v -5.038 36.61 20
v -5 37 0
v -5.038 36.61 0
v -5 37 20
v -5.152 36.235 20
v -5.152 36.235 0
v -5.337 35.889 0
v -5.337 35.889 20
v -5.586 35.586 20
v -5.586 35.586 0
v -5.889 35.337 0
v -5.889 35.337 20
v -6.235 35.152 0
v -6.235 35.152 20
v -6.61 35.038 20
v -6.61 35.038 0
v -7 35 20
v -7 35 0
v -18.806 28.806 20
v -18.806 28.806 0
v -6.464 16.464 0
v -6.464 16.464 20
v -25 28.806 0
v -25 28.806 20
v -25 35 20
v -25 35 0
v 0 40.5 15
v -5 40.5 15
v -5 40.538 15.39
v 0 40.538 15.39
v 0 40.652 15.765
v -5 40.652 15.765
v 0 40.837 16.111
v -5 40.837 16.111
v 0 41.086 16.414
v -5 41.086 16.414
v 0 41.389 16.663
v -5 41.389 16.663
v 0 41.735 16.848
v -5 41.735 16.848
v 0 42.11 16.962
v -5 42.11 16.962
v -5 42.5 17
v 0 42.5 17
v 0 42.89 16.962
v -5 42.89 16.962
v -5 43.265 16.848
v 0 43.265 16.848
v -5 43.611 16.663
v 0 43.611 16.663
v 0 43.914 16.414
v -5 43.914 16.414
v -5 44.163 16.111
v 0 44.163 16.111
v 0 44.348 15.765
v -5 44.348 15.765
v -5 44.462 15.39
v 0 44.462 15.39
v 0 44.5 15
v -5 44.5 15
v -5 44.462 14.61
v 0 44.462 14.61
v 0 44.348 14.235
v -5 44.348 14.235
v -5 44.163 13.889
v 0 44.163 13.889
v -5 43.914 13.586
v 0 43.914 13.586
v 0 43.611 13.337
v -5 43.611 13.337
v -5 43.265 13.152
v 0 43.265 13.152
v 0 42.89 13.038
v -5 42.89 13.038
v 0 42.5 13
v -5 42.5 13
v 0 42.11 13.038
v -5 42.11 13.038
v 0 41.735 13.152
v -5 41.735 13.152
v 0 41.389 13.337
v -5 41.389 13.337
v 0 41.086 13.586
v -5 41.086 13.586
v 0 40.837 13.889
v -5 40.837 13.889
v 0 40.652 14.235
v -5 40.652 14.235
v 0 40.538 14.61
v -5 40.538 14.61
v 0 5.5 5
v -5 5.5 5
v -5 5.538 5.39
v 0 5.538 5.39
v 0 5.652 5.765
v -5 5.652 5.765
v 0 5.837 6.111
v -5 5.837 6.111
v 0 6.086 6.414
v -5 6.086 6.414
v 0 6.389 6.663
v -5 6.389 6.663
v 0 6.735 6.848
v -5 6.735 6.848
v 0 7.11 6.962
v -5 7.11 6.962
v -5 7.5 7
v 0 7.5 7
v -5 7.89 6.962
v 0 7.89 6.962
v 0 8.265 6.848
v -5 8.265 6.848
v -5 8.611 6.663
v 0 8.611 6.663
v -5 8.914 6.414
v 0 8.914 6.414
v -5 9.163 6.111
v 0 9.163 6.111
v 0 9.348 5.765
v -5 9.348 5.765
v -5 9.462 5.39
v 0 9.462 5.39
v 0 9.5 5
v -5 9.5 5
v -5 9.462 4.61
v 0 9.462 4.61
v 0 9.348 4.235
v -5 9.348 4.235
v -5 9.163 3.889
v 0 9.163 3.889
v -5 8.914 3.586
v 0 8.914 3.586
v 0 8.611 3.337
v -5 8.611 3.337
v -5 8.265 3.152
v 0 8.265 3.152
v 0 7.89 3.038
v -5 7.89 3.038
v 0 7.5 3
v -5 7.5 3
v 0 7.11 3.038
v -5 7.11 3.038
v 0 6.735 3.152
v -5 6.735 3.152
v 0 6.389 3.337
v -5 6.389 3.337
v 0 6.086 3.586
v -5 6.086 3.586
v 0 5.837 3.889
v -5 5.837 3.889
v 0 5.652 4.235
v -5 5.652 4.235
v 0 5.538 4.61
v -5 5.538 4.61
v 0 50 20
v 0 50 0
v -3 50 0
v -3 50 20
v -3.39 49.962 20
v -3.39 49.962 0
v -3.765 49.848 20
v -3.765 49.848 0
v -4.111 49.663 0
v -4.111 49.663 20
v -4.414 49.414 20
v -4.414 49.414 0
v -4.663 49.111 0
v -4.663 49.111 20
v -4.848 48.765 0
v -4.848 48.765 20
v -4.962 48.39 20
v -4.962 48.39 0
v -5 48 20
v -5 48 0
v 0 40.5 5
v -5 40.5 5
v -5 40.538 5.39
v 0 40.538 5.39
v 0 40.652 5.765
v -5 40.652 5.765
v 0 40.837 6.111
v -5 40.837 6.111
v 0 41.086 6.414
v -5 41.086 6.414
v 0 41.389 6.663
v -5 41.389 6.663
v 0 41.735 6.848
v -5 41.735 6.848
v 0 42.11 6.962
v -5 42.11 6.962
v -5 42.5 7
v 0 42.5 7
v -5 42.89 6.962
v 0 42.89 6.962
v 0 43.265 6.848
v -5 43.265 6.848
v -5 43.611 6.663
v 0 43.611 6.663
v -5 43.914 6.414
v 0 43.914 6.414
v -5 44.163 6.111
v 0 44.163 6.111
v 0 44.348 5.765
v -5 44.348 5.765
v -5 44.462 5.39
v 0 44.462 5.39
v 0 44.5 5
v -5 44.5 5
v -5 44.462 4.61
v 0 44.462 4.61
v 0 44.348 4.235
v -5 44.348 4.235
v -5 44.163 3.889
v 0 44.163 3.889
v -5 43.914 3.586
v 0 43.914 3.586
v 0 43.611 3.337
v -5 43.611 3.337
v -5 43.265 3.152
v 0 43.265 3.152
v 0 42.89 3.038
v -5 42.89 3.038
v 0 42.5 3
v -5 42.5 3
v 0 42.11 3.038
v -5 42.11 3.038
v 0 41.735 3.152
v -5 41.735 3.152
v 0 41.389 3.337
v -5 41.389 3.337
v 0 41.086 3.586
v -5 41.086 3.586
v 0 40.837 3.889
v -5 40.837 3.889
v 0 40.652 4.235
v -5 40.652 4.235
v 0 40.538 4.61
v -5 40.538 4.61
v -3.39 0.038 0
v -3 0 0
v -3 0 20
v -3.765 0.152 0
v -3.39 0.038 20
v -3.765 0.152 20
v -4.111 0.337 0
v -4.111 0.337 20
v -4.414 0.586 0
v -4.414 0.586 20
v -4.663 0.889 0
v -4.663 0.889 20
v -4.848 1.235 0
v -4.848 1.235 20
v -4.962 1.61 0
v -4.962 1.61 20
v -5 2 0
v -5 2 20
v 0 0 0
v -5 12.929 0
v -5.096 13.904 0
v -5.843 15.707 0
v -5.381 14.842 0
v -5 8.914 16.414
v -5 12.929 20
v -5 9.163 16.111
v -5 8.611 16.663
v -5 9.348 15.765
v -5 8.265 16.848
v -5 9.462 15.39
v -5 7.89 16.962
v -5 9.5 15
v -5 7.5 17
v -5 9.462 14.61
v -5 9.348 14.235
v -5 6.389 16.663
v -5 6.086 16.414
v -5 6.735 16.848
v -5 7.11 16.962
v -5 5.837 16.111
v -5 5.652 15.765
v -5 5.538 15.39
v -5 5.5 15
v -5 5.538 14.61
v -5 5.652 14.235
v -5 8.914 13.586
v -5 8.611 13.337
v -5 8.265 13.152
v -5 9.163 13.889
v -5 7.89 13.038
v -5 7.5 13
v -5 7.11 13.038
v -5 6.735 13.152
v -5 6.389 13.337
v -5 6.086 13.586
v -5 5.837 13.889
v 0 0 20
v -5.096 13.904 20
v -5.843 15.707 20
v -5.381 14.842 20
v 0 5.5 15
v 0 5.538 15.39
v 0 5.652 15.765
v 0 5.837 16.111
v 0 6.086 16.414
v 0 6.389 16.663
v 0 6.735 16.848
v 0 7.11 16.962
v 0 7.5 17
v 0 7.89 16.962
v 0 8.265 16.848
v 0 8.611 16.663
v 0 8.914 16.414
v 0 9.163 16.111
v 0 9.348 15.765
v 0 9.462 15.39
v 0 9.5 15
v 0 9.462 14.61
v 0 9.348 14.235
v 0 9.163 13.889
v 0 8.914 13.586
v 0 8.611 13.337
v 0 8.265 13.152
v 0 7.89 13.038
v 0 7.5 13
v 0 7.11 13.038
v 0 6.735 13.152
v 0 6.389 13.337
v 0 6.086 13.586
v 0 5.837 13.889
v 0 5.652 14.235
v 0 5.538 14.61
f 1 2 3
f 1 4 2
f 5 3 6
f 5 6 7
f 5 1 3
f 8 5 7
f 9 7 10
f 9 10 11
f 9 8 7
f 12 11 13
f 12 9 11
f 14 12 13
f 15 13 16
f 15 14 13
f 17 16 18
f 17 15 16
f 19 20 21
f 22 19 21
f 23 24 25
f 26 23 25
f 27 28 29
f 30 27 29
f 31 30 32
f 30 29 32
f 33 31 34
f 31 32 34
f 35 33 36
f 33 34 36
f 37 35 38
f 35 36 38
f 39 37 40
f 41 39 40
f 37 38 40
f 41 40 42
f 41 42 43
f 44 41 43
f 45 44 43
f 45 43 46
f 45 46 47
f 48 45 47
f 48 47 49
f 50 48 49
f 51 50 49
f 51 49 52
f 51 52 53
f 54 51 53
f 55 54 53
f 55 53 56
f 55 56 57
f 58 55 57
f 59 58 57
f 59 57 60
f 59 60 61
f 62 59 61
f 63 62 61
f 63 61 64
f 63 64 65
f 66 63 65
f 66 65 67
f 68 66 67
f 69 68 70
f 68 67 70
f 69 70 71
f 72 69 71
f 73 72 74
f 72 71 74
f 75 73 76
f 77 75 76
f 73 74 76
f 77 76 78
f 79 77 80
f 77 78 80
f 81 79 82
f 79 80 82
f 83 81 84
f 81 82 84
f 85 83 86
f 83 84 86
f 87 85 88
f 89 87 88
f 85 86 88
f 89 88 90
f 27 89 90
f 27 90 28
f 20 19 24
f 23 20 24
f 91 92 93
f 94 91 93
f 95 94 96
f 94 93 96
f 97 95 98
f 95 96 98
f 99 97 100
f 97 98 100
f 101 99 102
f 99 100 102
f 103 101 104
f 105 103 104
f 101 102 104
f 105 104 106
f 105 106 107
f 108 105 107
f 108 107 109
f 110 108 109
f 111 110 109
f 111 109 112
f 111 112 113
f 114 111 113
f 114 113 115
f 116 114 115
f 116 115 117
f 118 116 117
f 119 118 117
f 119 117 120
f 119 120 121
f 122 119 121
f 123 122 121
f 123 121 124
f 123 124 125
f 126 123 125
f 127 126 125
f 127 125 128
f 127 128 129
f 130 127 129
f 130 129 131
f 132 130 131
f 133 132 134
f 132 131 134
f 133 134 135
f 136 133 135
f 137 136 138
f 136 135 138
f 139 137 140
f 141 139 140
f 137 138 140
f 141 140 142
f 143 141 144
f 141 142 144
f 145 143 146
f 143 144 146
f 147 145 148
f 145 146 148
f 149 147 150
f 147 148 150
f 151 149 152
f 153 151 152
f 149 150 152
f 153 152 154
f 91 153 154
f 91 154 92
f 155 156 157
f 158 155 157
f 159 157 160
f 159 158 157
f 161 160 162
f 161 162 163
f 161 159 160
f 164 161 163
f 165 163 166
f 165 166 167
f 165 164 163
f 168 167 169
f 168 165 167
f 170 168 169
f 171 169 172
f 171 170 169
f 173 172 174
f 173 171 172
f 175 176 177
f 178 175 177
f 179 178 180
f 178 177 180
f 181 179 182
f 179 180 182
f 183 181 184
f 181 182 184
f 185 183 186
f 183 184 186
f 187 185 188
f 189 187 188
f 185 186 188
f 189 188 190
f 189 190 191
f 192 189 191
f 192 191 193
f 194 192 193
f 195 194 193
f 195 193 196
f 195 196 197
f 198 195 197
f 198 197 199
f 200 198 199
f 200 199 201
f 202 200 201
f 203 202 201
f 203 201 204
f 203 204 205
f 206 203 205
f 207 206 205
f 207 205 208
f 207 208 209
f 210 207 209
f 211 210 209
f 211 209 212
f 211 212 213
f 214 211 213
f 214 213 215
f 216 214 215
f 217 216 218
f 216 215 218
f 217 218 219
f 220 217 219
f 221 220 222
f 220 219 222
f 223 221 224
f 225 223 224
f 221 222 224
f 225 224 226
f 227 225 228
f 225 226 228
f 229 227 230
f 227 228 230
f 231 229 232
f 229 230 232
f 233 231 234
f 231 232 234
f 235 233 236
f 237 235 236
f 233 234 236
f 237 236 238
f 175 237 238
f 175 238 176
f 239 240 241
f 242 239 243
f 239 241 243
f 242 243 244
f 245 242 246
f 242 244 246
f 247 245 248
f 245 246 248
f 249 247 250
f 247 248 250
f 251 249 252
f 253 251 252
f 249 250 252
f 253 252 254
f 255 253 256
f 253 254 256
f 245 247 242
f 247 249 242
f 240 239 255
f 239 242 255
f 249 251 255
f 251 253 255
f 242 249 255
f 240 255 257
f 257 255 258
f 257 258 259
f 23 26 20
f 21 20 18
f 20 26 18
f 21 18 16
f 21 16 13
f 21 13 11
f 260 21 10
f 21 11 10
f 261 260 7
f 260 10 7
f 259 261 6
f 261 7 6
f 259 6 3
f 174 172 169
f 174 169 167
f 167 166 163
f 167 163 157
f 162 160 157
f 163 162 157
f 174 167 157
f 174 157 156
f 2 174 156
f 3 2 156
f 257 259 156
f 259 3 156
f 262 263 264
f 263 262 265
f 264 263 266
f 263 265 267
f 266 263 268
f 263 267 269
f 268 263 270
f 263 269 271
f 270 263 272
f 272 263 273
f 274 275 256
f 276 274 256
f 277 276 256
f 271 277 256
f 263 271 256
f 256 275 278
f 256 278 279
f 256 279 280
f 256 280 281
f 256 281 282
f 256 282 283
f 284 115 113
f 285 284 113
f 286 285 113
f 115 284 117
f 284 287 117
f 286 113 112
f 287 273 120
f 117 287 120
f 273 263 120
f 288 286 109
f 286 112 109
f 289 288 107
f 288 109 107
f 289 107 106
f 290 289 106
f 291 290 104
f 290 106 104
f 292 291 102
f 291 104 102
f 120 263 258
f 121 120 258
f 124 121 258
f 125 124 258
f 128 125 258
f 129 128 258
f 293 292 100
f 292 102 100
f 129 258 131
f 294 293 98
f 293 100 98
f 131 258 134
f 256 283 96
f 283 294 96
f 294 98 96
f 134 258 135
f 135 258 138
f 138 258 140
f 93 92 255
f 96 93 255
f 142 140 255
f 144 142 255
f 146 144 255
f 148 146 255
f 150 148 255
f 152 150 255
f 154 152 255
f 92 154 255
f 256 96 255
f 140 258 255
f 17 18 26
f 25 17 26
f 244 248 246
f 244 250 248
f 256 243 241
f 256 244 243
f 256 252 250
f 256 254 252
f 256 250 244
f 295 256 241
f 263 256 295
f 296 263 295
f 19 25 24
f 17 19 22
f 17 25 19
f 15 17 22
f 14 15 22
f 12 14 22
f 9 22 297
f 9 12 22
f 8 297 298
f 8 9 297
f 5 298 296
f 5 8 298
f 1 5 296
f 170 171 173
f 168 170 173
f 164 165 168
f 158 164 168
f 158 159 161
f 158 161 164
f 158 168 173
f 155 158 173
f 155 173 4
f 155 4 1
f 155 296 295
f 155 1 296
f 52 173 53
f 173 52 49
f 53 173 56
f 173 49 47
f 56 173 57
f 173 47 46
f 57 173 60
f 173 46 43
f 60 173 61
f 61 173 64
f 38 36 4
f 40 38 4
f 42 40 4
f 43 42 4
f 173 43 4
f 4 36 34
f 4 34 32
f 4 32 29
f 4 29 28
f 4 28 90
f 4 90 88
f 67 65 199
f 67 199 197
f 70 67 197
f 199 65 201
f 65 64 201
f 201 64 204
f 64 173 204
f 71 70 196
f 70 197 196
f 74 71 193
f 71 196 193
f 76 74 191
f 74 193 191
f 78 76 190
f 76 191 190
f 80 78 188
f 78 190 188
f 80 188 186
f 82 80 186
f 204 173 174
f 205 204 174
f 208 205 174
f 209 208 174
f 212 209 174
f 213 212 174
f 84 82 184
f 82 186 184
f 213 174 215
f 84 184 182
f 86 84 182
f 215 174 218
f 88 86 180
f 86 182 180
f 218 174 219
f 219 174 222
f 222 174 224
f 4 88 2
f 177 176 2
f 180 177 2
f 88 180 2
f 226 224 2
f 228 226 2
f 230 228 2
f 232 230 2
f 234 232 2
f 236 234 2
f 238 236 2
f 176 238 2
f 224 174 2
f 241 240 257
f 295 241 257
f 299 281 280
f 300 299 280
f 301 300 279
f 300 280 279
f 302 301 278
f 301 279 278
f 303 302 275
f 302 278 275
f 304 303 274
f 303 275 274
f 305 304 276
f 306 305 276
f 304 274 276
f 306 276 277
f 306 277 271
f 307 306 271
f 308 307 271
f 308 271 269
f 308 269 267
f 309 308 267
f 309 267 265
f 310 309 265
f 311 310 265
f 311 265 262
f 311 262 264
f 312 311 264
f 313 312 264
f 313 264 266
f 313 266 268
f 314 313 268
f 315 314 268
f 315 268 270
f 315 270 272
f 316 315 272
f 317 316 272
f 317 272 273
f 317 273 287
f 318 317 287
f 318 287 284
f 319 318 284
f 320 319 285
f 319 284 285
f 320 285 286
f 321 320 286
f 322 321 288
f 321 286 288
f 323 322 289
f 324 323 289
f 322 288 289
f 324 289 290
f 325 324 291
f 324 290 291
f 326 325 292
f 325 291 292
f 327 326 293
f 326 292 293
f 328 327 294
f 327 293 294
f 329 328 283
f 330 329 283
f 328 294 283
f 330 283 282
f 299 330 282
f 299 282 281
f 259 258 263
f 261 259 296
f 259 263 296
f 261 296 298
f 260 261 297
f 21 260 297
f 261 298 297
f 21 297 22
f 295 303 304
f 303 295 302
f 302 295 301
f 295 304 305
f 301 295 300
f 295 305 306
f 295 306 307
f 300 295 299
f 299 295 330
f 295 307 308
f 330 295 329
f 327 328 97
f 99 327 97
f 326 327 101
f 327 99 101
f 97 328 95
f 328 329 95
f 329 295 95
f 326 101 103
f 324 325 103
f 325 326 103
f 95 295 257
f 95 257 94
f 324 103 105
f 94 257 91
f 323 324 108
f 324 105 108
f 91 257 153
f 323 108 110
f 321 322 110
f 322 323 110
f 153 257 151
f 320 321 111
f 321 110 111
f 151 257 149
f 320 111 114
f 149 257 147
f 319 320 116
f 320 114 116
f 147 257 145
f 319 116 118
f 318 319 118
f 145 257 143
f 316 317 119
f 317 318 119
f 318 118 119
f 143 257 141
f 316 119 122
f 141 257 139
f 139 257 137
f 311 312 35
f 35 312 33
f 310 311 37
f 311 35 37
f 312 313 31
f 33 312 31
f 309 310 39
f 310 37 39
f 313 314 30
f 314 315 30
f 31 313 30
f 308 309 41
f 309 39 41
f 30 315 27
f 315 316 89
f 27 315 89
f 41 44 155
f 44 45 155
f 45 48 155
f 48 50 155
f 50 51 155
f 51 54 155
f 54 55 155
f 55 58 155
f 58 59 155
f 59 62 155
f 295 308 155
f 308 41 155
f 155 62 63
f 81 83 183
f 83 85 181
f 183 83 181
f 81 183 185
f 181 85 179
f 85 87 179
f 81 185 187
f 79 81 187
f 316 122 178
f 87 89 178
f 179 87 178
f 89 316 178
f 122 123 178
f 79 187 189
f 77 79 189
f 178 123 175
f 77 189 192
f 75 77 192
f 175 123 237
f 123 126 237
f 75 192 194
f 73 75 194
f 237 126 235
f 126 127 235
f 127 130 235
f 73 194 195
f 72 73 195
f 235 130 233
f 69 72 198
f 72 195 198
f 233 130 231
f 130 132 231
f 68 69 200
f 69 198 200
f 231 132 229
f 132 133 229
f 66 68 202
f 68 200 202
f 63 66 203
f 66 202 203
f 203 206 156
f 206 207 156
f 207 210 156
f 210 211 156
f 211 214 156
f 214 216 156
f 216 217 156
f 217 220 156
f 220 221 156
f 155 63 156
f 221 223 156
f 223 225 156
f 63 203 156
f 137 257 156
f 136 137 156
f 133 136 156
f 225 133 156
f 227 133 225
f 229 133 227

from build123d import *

# Parameters (mm, degrees)
EXTRUDE_1_DEPTH     = 20
SKETCH_2_R          = 2
CUT_EXTRUDE_1_DEPTH = 20
FILLET_1_R          = 2
FILLET_2_R          = 5
SKETCH_3_W          = 6.194211673
SKETCH_3_H          = 6.194211673
EXTRUDE_2_DEPTH     = 20


with BuildPart() as part:
    # 草图1 → 凸台-拉伸1 (new body)
    with BuildSketch(Plane.XY):
        Polygon((0, 0), (0, 50), (-5, 50), (-5, 35), (-25, 35), (-5, 15), (-5, 0), align=None)
    extrude(amount=EXTRUDE_1_DEPTH)

    # 草图2 → 切除-拉伸1 (cut)
    with BuildSketch(Plane.ZY.offset(5)):
        with Locations(Location((5, 42.5, 0), (0, 0, 270))):
            Circle(SKETCH_2_R)
        with Locations(Location((15, 42.5, 0), (0, 0, 270))):
            Circle(SKETCH_2_R)
        with Locations(Location((5, 7.5, 0), (0, 0, 270))):
            Circle(SKETCH_2_R)
        with Locations(Location((15, 7.5, 0), (0, 0, 270))):
            Circle(SKETCH_2_R)
    extrude(amount=-CUT_EXTRUDE_1_DEPTH, mode=Mode.SUBTRACT)

    # 圆角1
    fillet_1_edges = [part.edges().sort_by_distance(p)[0] for p in [
        (-5, 0, 10),
        (-5, 35, 10),
        (-5, 50, 10),
    ]]
    fillet(fillet_1_edges, radius=FILLET_1_R)

    # 圆角2
    fillet_2_edges = [part.edges().sort_by_distance(p)[0] for p in [
        (-5, 15, 10),
    ]]
    fillet(fillet_2_edges, radius=FILLET_2_R)

    # 草图3 → 凸台-拉伸2 (add, through all)
    with BuildSketch(Plane(origin=(0, 0, 0), x_dir=(-1, 0, 0), z_dir=(0, 0, -1))):
        with Locations((21.902894164, 31.902894164)):
            Rectangle(SKETCH_3_W, SKETCH_3_H)
    extrude(amount=-EXTRUDE_2_DEPTH)


solid = part.part
